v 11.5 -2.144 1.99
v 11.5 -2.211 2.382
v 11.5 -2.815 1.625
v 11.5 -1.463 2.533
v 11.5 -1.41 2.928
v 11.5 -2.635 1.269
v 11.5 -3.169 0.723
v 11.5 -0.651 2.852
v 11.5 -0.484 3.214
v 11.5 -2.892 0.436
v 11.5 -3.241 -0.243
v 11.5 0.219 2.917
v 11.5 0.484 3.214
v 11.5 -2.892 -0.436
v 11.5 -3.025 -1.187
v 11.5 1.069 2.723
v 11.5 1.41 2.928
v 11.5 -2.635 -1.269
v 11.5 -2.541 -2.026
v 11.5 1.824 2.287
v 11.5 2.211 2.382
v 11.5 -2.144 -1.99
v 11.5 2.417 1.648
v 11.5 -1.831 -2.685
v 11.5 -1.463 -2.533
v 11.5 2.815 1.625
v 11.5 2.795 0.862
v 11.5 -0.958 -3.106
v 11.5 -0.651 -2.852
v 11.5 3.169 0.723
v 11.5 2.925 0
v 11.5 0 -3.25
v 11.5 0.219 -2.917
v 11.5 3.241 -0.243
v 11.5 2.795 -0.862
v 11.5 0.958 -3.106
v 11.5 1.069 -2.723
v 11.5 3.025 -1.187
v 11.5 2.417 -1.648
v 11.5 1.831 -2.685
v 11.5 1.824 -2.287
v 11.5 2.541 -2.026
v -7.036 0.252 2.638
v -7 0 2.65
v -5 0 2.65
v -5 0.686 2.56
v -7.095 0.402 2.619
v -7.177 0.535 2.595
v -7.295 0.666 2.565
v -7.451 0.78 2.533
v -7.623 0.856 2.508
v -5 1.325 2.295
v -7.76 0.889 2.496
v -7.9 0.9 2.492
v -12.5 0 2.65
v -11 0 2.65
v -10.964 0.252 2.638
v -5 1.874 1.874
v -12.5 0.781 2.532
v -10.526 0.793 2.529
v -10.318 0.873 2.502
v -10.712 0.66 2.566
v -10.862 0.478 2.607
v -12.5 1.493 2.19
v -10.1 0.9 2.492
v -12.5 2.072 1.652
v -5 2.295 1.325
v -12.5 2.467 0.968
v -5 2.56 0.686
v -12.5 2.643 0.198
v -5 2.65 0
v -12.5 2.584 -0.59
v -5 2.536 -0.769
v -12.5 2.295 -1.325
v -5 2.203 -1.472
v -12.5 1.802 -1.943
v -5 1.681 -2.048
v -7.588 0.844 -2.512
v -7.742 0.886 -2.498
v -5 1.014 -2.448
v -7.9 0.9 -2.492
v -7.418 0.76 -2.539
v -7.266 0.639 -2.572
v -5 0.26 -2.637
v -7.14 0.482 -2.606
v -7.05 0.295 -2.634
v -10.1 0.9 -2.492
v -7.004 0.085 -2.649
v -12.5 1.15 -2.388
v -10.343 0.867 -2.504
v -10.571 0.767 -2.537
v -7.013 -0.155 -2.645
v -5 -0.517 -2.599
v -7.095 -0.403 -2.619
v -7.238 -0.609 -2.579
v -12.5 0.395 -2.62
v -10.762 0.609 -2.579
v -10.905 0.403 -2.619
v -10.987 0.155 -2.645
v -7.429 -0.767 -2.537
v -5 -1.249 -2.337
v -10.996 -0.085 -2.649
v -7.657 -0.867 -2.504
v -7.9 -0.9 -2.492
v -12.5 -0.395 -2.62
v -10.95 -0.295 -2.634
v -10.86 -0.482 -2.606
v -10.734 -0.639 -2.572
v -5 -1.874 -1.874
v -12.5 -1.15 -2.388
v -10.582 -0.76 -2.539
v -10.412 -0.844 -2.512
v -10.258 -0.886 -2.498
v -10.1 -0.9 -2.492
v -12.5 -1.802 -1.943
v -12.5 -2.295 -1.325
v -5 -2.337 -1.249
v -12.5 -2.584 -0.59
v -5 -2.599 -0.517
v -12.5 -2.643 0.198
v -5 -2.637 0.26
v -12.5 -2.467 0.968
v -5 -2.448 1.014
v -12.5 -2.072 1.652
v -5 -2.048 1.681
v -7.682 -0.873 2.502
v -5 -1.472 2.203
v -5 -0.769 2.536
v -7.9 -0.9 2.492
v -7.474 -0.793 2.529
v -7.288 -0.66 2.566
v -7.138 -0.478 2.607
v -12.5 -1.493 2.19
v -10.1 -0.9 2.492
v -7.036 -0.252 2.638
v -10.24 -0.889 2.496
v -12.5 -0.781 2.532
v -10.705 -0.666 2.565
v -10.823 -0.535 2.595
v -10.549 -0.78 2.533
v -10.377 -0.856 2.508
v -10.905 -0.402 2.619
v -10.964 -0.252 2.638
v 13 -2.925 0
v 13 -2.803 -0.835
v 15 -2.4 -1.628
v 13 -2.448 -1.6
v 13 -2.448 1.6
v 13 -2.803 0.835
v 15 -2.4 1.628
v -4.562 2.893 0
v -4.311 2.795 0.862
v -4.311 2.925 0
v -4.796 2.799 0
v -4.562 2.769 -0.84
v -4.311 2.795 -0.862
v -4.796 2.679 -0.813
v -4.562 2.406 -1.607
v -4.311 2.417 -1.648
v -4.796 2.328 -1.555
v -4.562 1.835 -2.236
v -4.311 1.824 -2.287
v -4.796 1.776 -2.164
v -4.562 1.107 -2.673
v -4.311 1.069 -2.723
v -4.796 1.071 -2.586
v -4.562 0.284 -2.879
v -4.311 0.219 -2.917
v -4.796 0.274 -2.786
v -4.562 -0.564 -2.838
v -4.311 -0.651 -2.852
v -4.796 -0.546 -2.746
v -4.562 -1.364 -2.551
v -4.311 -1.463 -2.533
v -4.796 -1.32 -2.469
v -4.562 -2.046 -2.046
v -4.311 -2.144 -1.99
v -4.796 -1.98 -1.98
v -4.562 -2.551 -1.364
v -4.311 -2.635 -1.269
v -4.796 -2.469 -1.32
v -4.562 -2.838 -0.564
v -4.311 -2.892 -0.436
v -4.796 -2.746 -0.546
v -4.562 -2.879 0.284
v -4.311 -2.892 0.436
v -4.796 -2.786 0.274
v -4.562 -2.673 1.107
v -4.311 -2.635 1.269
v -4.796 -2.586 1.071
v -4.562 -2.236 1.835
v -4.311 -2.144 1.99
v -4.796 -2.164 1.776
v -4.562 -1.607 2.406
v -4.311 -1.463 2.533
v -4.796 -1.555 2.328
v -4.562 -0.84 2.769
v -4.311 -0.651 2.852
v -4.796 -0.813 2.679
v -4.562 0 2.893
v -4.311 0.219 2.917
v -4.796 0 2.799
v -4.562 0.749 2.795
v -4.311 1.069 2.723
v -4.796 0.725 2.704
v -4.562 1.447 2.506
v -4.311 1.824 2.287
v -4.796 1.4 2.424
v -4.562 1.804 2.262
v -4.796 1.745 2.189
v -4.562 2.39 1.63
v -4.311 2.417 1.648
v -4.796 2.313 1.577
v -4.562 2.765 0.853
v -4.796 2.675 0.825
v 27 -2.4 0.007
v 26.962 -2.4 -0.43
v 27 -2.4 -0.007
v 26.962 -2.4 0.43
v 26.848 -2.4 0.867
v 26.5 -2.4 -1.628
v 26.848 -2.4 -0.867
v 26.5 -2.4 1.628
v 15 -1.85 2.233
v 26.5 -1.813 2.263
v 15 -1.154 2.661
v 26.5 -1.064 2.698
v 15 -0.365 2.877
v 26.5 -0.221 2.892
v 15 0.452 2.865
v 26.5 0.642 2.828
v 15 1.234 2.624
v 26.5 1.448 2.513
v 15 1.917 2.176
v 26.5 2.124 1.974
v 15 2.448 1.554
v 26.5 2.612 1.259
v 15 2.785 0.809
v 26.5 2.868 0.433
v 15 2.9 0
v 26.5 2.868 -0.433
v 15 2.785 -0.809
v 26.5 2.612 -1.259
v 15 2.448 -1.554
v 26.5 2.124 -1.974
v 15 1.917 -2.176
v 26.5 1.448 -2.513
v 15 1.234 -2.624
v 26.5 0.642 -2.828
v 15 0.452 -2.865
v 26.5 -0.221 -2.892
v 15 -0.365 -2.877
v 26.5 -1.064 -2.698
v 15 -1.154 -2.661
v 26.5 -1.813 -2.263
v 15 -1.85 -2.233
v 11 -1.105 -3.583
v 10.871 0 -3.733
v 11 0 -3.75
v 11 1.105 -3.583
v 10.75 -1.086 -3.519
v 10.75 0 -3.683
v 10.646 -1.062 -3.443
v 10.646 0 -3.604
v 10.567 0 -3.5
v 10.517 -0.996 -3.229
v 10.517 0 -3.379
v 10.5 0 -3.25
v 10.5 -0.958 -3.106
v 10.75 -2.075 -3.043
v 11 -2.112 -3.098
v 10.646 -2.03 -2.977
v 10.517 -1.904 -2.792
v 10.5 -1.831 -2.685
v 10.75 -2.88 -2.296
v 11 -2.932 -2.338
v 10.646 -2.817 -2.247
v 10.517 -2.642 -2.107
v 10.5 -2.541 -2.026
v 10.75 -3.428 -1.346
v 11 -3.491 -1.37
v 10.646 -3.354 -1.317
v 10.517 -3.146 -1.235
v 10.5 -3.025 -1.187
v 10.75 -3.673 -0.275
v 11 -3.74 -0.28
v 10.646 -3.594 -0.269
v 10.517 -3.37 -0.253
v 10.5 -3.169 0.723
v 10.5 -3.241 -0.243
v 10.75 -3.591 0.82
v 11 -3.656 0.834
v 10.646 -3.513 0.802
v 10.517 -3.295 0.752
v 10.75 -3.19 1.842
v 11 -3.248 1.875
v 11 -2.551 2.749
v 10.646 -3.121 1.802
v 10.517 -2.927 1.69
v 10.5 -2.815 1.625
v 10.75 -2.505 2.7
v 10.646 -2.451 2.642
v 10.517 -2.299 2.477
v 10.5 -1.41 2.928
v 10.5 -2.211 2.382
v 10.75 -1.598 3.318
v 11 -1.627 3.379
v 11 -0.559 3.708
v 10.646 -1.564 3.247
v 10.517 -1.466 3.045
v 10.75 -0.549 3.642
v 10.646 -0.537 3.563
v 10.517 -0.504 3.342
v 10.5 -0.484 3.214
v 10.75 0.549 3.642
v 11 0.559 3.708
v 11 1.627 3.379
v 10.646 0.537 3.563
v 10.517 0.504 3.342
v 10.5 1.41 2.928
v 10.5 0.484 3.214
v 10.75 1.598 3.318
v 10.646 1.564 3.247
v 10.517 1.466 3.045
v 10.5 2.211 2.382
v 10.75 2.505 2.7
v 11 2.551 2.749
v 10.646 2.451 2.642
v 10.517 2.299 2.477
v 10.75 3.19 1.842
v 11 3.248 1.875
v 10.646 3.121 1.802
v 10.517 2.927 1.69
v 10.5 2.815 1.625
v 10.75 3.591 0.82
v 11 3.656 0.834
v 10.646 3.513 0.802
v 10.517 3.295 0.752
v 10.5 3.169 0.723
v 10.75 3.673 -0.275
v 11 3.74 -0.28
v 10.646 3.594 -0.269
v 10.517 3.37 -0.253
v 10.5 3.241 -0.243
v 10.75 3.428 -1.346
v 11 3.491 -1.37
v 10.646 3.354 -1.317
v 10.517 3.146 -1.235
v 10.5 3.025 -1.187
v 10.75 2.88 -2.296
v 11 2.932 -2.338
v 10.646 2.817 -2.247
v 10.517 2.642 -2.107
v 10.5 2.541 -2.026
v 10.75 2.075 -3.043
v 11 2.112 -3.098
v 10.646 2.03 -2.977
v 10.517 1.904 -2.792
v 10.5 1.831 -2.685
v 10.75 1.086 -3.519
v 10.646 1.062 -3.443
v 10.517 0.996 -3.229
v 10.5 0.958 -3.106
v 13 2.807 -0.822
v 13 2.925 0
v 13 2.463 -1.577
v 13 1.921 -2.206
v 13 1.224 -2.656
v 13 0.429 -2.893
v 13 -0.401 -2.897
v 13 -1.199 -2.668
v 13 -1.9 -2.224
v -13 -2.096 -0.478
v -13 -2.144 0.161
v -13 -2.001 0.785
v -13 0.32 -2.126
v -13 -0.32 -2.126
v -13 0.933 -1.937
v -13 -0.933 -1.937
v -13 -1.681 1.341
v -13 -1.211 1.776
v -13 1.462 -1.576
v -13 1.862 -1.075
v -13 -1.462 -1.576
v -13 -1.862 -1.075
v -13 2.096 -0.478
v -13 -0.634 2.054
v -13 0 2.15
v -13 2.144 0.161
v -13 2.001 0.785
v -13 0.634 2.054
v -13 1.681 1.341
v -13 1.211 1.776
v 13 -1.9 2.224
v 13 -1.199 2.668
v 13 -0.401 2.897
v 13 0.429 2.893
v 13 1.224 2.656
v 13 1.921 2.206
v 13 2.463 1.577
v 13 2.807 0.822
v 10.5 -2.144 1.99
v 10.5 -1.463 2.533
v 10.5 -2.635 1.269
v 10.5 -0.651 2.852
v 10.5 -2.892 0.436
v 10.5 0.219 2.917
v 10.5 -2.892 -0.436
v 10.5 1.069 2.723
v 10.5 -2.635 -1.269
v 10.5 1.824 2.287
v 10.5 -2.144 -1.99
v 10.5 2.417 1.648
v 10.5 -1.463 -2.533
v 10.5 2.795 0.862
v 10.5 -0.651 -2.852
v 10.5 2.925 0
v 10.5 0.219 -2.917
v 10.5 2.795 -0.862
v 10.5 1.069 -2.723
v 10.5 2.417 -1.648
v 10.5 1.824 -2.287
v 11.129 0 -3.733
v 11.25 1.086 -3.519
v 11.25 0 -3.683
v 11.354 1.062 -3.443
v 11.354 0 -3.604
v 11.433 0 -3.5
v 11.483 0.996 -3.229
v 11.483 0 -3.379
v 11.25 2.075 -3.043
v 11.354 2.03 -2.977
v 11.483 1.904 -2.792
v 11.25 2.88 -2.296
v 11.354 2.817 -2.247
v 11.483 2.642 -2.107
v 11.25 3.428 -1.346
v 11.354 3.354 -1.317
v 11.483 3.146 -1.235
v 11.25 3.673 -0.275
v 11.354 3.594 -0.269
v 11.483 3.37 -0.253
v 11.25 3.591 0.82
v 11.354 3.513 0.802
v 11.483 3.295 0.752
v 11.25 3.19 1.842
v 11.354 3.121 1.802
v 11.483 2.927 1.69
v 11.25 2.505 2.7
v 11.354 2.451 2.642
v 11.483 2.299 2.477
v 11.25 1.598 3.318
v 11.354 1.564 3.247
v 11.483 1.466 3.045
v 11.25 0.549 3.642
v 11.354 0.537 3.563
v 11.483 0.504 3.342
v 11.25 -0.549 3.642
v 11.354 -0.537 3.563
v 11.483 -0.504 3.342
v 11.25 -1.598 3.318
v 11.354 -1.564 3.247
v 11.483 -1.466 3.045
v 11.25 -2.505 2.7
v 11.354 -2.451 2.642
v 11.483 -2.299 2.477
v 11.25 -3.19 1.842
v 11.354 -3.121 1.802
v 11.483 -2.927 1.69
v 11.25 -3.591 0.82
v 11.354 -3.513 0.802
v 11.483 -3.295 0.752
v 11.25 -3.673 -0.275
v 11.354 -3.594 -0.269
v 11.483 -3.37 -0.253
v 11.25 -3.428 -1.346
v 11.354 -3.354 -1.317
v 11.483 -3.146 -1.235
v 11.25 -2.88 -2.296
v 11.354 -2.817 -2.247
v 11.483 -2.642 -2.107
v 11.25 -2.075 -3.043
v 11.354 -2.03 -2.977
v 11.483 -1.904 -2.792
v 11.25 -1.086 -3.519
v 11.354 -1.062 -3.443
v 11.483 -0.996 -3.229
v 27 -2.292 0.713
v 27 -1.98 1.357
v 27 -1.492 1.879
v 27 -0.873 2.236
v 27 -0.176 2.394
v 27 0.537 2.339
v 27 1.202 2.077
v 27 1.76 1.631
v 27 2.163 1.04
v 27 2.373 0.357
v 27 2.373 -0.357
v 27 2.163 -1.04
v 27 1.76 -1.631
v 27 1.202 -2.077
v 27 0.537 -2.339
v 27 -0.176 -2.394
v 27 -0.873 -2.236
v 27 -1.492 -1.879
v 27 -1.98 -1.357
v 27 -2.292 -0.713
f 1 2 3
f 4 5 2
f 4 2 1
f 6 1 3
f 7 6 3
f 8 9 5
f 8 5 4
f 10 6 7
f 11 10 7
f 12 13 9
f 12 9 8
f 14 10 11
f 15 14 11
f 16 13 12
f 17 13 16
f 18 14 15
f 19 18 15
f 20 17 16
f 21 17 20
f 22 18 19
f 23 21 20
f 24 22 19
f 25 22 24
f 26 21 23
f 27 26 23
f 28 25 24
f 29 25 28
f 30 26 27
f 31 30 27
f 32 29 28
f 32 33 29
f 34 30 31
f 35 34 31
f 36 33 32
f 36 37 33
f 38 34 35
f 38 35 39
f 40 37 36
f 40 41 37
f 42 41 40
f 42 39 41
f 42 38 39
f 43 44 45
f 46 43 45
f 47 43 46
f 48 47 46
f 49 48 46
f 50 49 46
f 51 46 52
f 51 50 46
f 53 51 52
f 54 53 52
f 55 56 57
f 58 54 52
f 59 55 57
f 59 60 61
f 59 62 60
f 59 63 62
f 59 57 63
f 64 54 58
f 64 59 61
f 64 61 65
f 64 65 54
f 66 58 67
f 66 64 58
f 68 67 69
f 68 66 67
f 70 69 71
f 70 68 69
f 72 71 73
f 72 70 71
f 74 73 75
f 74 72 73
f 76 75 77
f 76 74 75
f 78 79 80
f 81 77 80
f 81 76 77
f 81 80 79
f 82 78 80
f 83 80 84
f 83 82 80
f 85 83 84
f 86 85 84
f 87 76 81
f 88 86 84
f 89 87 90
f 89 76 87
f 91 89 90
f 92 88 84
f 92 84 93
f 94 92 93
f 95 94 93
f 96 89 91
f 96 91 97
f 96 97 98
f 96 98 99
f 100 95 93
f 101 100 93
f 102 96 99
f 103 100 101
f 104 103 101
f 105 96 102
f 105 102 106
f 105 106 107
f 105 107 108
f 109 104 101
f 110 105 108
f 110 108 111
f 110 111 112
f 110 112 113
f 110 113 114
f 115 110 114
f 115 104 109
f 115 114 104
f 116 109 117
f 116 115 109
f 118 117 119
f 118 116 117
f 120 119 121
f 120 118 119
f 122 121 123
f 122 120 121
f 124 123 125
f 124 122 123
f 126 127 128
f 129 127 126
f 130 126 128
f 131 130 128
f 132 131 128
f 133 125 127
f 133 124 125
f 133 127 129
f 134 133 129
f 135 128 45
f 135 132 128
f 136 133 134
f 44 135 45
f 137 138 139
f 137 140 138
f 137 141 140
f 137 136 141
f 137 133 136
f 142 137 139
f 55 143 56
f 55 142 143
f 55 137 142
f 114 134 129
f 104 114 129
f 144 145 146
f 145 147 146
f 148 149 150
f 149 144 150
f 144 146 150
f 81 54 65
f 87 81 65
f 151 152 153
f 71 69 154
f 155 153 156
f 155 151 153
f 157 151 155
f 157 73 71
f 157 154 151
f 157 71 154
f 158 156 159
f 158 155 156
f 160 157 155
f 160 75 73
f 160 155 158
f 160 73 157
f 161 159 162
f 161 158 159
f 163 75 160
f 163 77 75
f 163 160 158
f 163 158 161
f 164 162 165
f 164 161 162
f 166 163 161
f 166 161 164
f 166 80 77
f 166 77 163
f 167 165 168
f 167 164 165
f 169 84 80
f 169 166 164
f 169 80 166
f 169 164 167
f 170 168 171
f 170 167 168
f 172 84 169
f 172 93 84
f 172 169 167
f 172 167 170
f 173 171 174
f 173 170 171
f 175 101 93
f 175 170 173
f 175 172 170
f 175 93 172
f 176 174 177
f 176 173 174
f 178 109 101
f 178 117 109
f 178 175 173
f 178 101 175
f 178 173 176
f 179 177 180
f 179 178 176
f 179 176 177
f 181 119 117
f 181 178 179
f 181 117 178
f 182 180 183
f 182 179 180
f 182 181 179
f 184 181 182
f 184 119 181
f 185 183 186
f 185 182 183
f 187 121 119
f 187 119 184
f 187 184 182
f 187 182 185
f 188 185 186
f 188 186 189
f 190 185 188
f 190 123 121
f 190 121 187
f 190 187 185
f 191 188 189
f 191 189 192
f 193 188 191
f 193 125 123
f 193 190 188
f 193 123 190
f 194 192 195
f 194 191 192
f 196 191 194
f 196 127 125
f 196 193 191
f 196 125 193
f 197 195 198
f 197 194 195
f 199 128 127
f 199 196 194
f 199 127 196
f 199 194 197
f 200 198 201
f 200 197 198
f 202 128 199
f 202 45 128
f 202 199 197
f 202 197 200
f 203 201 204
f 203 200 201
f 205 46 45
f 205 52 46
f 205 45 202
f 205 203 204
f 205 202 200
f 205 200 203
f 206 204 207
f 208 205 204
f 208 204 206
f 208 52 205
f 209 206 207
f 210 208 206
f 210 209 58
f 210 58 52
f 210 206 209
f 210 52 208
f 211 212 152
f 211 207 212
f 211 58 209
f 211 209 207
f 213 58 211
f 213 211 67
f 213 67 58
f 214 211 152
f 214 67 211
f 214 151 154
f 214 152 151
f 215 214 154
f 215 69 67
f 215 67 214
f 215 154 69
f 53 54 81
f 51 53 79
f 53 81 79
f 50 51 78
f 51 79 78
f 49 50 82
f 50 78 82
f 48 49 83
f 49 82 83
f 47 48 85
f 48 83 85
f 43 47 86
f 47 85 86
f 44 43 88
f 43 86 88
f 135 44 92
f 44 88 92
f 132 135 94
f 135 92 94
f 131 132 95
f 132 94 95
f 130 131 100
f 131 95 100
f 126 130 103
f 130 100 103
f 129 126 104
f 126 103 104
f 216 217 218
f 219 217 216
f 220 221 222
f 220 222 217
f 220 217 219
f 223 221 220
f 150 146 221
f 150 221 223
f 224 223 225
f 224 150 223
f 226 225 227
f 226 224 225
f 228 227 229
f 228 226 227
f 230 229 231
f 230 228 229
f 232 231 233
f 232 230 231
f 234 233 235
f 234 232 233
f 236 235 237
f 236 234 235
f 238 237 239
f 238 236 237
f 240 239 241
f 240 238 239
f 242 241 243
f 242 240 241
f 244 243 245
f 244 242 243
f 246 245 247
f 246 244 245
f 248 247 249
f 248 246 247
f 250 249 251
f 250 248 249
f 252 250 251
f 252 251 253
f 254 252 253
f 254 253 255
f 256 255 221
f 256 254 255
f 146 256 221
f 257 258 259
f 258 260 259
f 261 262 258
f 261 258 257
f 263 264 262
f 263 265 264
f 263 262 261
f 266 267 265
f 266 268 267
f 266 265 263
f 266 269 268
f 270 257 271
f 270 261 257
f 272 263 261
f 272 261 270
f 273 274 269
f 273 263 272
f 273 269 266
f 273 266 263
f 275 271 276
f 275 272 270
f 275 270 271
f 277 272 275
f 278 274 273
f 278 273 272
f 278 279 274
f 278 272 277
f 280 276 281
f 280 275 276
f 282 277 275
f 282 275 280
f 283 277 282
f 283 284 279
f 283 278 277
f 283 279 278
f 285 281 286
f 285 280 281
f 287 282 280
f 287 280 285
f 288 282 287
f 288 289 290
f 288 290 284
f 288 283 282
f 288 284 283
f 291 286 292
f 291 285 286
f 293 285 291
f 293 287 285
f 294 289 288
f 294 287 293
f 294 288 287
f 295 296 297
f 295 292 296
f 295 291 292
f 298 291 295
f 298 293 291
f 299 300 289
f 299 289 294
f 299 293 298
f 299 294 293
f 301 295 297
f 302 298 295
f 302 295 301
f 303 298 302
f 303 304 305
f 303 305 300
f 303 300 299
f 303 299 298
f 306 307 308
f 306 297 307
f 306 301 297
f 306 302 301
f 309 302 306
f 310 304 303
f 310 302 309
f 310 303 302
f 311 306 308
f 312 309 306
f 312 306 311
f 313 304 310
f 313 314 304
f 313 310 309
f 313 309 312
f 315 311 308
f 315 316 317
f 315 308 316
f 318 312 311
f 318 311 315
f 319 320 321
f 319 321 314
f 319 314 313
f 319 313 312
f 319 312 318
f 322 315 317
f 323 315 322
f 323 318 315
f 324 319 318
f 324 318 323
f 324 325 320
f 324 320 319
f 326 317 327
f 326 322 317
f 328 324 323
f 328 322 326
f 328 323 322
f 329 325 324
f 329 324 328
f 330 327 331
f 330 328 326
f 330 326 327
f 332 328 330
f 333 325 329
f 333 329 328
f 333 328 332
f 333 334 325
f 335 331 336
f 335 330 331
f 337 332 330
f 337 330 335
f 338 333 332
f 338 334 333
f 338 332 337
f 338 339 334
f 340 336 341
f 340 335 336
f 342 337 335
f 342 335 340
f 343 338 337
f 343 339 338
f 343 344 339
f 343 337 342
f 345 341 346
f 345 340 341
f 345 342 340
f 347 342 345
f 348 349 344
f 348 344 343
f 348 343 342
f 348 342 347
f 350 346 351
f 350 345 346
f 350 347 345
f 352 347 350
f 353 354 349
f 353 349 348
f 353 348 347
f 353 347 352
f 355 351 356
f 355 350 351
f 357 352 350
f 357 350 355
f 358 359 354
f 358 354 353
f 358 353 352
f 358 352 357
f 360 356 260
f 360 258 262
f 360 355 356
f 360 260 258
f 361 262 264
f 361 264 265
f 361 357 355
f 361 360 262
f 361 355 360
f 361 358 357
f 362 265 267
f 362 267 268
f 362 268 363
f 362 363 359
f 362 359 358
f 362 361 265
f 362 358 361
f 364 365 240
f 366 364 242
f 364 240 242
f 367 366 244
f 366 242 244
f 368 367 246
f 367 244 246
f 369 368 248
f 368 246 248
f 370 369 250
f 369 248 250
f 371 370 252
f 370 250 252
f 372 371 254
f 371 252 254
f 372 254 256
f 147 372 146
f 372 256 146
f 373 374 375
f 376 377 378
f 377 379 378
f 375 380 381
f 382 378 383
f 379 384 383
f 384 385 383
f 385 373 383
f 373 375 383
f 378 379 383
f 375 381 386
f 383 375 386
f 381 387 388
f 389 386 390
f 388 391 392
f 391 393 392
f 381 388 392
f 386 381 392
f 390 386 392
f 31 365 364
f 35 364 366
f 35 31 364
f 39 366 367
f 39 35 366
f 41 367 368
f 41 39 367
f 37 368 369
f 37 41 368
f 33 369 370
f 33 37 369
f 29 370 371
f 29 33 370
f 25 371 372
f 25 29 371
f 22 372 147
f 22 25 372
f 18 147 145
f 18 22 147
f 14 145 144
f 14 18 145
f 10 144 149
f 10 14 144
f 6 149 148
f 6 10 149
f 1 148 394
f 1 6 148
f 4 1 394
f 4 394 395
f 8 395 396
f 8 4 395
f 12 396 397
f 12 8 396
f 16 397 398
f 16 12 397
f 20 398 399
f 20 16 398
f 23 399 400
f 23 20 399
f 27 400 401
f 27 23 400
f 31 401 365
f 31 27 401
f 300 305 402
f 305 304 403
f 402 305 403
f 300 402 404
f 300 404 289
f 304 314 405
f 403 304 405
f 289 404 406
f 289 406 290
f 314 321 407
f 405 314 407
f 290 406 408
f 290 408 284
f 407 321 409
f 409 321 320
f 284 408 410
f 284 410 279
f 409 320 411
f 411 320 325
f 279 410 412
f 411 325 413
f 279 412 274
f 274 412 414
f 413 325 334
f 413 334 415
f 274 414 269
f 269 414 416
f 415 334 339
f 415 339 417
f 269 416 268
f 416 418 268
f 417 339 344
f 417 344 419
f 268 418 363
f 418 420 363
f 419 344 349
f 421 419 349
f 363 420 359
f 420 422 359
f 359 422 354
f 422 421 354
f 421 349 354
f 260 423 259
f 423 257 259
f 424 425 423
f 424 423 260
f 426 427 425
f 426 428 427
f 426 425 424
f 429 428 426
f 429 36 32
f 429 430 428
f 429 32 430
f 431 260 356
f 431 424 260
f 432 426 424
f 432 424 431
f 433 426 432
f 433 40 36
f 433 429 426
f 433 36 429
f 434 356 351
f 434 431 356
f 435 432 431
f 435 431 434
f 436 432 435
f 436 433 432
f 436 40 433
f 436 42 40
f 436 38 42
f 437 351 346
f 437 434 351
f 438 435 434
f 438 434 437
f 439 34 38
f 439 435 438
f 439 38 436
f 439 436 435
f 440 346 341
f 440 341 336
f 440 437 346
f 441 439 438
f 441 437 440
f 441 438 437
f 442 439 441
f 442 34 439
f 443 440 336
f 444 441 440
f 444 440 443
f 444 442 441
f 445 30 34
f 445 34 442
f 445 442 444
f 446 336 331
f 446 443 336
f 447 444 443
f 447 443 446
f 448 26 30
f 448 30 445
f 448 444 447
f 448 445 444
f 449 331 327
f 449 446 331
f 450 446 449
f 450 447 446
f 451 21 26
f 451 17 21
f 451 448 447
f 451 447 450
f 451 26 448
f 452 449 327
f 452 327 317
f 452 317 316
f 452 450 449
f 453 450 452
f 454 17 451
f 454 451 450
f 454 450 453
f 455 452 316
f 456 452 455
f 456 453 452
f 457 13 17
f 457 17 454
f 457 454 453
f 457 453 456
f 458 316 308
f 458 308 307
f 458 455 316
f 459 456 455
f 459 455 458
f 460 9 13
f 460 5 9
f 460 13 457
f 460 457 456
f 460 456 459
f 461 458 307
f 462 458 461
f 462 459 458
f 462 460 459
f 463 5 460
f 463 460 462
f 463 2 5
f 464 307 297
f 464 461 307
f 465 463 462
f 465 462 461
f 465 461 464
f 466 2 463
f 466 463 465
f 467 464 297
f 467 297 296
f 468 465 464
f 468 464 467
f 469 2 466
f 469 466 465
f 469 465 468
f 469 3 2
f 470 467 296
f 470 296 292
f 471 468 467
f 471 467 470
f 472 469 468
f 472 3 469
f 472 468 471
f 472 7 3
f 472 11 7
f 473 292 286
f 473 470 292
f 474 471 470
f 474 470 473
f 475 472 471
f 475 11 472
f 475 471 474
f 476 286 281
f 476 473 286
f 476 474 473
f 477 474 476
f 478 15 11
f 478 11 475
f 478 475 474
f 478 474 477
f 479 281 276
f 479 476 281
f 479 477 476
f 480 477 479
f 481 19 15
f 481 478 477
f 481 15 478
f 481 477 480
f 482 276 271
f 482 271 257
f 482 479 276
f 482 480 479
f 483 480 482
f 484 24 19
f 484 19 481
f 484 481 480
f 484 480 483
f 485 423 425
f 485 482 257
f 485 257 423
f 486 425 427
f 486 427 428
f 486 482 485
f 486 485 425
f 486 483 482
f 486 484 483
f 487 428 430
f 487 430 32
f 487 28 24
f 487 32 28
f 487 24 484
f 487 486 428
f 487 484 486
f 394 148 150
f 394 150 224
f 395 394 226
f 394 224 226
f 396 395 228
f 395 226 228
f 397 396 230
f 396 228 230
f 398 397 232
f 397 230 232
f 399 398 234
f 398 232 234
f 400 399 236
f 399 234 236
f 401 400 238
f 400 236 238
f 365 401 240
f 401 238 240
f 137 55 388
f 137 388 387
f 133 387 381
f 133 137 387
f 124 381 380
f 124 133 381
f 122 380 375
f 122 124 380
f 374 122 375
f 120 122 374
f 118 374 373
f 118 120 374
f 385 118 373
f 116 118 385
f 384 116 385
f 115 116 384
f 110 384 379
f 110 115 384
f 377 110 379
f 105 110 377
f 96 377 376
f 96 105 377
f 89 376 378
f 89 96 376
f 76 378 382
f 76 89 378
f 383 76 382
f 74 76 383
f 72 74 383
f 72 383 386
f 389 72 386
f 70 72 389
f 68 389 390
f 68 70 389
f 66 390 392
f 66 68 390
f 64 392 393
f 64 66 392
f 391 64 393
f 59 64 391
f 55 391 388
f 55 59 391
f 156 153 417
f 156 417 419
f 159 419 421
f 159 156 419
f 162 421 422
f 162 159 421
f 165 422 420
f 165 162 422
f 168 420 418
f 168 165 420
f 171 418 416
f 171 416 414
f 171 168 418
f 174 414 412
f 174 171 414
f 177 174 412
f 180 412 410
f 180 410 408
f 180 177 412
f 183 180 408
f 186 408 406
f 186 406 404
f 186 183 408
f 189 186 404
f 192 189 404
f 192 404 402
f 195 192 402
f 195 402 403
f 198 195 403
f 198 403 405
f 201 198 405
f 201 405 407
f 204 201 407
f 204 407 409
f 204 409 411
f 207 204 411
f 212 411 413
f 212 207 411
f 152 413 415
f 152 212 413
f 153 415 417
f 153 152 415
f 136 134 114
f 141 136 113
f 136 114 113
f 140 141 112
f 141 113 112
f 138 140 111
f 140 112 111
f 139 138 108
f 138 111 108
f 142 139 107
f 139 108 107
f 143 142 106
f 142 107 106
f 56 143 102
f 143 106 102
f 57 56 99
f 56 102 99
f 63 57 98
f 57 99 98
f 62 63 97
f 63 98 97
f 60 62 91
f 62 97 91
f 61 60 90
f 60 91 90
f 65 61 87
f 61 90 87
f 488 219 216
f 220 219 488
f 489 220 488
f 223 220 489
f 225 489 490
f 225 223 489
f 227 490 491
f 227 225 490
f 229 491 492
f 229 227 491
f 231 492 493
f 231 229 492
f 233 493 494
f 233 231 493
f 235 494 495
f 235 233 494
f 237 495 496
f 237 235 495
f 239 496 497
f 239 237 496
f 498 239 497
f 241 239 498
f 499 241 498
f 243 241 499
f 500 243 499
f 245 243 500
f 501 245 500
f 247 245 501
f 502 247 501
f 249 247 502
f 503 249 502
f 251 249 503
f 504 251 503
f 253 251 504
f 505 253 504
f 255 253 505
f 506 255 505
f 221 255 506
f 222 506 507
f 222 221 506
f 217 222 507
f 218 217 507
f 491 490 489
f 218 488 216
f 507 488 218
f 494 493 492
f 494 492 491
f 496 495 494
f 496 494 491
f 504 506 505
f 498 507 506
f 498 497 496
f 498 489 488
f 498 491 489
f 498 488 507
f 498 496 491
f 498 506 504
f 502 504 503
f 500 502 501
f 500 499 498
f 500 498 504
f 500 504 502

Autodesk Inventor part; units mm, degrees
ref_plane "YZ Plane" through (0, 0, 0) normal (1, 0, 0) x (0, 1, 0)
ref_plane "XZ Plane" through (0, 0, 0) normal (0, 1, 0) x (-1, 0, 0)
sketch "Sketch1" plane through (0, 0, 0) normal (1, 0, 0) x (0, 1, 0)
  circle A0 centre (0, 0) radius 2.925
  dimension "diameter" = 5.85
extrude "Shaft" add sketch "Sketch1" along normal mid plane 26
sketch "Sketch2" plane through (0, 0, 0) normal (0, 0, 1) x (1, 0, 0)
  line L0 (-13, -2.925) -> (-13, 2.925) construction
  line L1 (13, -2.925) -> (-13, -2.925) construction
  line L2 (13, 2.925) -> (13, -2.925) construction
  line L3 (-13, 2.925) -> (13, 2.925) construction
  line L4 (-13, -2.925) -> (13, -2.925) projected
  line L5 (-6, -2.925) -> (-6, -2.925)
  line L6 (-13, -2.925) -> (13, -2.925) projected
  line L7 (-11, 0) -> (-7, 0) construction
  line L8 (-10.1, -0.9) -> (-7.9, -0.9)
  line L9 (-7.9, 0.9) -> (-10.1, 0.9)
  arc A0 (-10.1, 0.9) -> (-10.1, -0.9) centre (-10.1, 0) ccw
  arc A1 (-7.9, -0.9) -> (-7.9, 0.9) centre (-7.9, 0) ccw
  point P0 (0, 0)
  point P1 (13, 0)
  point P2 (-9, 0)
  dimension "d17" = 1.8
  dimension "d20" = 2
  dimension "d21" = 1
  dimension "d22" = 7
extrude "Slot for Differential Gear" cut sketch "Sketch2" along normal through all both and the other way through all
ref_plane "Work Plane1" through (15, 0, 0) normal (1, 0, 0) x (0, 0, -1)
sketch "Sketch3" plane through (15, 0, 0) normal (1, 0, 0) x (0, 0, -1)
  arc A0 (1.6583, -2.5) -> (-1.6583, -2.5) centre (0, 0) ccw construction
  circle A1 centre (0, 0) radius 2.925 construction
  line L0 (-1.6583, -2.5) -> (1.6583, -2.5)
  arc A2 (1.6279, -2.4) -> (-1.6279, -2.4) centre (0, 0) ccw
  line L1 (1.6279, -2.4) -> (-1.6279, -2.4)
  point P0 (-1.5184, -2.5)
  point P1 (1.5184, -2.5)
  dimension "d49" = 3
  dimension "d50" = 2.5
  dimension "wheel_offset" = 0.1
extrude "Wheel Insert Profile" add sketch "Sketch3" along normal blind 12
loft "Loft1" add section 1 edges at (13, -2.925, 0) section 2 edges at (15, -2.4, 0) (15, 2.9, 0)
ref_plane "Work Plane2" through (11.5, 0, 0) normal (1, 0, 0) x (0, 0, -1)
sketch "Sketch4" plane through (11.5, 0, 0) normal (1, 0, 0) x (0, 0, -1)
  circle A0 centre (0, 0) radius 3.75
  dimension "d35" = 7.5
extrude "Stopper" add sketch "Sketch4" against normal blind 1
fillet "Fillet1" radius 0.5 2 edges at (11.5, 0, 3.75) (10.5, 0, 3.75)
sketch "Sketch8" plane through (-13, 0, 0) normal (-1, 0, 0) x (0, 0, 1)
  circle A0 centre (0, 0) radius 2.925 projected
  circle A1 centre (0, 0) radius 2.7 construction
  circle A2 centre (0, 0) radius 2.65
  dimension "d68" = 5.4
  dimension "d69" = 0.05
extrude "Differential Gear Insert Profile" cut sketch "Sketch8" against normal blind 8
fillet "Fillet3" radius 1 1 edges at (-5, -2.925, 0)
chamfer "Chamfer4" distance 0.5 angle 45 2 edges at (-13, 0, -2.65) (27, 2.9, 0)
properties part number "rear shaft v2"
